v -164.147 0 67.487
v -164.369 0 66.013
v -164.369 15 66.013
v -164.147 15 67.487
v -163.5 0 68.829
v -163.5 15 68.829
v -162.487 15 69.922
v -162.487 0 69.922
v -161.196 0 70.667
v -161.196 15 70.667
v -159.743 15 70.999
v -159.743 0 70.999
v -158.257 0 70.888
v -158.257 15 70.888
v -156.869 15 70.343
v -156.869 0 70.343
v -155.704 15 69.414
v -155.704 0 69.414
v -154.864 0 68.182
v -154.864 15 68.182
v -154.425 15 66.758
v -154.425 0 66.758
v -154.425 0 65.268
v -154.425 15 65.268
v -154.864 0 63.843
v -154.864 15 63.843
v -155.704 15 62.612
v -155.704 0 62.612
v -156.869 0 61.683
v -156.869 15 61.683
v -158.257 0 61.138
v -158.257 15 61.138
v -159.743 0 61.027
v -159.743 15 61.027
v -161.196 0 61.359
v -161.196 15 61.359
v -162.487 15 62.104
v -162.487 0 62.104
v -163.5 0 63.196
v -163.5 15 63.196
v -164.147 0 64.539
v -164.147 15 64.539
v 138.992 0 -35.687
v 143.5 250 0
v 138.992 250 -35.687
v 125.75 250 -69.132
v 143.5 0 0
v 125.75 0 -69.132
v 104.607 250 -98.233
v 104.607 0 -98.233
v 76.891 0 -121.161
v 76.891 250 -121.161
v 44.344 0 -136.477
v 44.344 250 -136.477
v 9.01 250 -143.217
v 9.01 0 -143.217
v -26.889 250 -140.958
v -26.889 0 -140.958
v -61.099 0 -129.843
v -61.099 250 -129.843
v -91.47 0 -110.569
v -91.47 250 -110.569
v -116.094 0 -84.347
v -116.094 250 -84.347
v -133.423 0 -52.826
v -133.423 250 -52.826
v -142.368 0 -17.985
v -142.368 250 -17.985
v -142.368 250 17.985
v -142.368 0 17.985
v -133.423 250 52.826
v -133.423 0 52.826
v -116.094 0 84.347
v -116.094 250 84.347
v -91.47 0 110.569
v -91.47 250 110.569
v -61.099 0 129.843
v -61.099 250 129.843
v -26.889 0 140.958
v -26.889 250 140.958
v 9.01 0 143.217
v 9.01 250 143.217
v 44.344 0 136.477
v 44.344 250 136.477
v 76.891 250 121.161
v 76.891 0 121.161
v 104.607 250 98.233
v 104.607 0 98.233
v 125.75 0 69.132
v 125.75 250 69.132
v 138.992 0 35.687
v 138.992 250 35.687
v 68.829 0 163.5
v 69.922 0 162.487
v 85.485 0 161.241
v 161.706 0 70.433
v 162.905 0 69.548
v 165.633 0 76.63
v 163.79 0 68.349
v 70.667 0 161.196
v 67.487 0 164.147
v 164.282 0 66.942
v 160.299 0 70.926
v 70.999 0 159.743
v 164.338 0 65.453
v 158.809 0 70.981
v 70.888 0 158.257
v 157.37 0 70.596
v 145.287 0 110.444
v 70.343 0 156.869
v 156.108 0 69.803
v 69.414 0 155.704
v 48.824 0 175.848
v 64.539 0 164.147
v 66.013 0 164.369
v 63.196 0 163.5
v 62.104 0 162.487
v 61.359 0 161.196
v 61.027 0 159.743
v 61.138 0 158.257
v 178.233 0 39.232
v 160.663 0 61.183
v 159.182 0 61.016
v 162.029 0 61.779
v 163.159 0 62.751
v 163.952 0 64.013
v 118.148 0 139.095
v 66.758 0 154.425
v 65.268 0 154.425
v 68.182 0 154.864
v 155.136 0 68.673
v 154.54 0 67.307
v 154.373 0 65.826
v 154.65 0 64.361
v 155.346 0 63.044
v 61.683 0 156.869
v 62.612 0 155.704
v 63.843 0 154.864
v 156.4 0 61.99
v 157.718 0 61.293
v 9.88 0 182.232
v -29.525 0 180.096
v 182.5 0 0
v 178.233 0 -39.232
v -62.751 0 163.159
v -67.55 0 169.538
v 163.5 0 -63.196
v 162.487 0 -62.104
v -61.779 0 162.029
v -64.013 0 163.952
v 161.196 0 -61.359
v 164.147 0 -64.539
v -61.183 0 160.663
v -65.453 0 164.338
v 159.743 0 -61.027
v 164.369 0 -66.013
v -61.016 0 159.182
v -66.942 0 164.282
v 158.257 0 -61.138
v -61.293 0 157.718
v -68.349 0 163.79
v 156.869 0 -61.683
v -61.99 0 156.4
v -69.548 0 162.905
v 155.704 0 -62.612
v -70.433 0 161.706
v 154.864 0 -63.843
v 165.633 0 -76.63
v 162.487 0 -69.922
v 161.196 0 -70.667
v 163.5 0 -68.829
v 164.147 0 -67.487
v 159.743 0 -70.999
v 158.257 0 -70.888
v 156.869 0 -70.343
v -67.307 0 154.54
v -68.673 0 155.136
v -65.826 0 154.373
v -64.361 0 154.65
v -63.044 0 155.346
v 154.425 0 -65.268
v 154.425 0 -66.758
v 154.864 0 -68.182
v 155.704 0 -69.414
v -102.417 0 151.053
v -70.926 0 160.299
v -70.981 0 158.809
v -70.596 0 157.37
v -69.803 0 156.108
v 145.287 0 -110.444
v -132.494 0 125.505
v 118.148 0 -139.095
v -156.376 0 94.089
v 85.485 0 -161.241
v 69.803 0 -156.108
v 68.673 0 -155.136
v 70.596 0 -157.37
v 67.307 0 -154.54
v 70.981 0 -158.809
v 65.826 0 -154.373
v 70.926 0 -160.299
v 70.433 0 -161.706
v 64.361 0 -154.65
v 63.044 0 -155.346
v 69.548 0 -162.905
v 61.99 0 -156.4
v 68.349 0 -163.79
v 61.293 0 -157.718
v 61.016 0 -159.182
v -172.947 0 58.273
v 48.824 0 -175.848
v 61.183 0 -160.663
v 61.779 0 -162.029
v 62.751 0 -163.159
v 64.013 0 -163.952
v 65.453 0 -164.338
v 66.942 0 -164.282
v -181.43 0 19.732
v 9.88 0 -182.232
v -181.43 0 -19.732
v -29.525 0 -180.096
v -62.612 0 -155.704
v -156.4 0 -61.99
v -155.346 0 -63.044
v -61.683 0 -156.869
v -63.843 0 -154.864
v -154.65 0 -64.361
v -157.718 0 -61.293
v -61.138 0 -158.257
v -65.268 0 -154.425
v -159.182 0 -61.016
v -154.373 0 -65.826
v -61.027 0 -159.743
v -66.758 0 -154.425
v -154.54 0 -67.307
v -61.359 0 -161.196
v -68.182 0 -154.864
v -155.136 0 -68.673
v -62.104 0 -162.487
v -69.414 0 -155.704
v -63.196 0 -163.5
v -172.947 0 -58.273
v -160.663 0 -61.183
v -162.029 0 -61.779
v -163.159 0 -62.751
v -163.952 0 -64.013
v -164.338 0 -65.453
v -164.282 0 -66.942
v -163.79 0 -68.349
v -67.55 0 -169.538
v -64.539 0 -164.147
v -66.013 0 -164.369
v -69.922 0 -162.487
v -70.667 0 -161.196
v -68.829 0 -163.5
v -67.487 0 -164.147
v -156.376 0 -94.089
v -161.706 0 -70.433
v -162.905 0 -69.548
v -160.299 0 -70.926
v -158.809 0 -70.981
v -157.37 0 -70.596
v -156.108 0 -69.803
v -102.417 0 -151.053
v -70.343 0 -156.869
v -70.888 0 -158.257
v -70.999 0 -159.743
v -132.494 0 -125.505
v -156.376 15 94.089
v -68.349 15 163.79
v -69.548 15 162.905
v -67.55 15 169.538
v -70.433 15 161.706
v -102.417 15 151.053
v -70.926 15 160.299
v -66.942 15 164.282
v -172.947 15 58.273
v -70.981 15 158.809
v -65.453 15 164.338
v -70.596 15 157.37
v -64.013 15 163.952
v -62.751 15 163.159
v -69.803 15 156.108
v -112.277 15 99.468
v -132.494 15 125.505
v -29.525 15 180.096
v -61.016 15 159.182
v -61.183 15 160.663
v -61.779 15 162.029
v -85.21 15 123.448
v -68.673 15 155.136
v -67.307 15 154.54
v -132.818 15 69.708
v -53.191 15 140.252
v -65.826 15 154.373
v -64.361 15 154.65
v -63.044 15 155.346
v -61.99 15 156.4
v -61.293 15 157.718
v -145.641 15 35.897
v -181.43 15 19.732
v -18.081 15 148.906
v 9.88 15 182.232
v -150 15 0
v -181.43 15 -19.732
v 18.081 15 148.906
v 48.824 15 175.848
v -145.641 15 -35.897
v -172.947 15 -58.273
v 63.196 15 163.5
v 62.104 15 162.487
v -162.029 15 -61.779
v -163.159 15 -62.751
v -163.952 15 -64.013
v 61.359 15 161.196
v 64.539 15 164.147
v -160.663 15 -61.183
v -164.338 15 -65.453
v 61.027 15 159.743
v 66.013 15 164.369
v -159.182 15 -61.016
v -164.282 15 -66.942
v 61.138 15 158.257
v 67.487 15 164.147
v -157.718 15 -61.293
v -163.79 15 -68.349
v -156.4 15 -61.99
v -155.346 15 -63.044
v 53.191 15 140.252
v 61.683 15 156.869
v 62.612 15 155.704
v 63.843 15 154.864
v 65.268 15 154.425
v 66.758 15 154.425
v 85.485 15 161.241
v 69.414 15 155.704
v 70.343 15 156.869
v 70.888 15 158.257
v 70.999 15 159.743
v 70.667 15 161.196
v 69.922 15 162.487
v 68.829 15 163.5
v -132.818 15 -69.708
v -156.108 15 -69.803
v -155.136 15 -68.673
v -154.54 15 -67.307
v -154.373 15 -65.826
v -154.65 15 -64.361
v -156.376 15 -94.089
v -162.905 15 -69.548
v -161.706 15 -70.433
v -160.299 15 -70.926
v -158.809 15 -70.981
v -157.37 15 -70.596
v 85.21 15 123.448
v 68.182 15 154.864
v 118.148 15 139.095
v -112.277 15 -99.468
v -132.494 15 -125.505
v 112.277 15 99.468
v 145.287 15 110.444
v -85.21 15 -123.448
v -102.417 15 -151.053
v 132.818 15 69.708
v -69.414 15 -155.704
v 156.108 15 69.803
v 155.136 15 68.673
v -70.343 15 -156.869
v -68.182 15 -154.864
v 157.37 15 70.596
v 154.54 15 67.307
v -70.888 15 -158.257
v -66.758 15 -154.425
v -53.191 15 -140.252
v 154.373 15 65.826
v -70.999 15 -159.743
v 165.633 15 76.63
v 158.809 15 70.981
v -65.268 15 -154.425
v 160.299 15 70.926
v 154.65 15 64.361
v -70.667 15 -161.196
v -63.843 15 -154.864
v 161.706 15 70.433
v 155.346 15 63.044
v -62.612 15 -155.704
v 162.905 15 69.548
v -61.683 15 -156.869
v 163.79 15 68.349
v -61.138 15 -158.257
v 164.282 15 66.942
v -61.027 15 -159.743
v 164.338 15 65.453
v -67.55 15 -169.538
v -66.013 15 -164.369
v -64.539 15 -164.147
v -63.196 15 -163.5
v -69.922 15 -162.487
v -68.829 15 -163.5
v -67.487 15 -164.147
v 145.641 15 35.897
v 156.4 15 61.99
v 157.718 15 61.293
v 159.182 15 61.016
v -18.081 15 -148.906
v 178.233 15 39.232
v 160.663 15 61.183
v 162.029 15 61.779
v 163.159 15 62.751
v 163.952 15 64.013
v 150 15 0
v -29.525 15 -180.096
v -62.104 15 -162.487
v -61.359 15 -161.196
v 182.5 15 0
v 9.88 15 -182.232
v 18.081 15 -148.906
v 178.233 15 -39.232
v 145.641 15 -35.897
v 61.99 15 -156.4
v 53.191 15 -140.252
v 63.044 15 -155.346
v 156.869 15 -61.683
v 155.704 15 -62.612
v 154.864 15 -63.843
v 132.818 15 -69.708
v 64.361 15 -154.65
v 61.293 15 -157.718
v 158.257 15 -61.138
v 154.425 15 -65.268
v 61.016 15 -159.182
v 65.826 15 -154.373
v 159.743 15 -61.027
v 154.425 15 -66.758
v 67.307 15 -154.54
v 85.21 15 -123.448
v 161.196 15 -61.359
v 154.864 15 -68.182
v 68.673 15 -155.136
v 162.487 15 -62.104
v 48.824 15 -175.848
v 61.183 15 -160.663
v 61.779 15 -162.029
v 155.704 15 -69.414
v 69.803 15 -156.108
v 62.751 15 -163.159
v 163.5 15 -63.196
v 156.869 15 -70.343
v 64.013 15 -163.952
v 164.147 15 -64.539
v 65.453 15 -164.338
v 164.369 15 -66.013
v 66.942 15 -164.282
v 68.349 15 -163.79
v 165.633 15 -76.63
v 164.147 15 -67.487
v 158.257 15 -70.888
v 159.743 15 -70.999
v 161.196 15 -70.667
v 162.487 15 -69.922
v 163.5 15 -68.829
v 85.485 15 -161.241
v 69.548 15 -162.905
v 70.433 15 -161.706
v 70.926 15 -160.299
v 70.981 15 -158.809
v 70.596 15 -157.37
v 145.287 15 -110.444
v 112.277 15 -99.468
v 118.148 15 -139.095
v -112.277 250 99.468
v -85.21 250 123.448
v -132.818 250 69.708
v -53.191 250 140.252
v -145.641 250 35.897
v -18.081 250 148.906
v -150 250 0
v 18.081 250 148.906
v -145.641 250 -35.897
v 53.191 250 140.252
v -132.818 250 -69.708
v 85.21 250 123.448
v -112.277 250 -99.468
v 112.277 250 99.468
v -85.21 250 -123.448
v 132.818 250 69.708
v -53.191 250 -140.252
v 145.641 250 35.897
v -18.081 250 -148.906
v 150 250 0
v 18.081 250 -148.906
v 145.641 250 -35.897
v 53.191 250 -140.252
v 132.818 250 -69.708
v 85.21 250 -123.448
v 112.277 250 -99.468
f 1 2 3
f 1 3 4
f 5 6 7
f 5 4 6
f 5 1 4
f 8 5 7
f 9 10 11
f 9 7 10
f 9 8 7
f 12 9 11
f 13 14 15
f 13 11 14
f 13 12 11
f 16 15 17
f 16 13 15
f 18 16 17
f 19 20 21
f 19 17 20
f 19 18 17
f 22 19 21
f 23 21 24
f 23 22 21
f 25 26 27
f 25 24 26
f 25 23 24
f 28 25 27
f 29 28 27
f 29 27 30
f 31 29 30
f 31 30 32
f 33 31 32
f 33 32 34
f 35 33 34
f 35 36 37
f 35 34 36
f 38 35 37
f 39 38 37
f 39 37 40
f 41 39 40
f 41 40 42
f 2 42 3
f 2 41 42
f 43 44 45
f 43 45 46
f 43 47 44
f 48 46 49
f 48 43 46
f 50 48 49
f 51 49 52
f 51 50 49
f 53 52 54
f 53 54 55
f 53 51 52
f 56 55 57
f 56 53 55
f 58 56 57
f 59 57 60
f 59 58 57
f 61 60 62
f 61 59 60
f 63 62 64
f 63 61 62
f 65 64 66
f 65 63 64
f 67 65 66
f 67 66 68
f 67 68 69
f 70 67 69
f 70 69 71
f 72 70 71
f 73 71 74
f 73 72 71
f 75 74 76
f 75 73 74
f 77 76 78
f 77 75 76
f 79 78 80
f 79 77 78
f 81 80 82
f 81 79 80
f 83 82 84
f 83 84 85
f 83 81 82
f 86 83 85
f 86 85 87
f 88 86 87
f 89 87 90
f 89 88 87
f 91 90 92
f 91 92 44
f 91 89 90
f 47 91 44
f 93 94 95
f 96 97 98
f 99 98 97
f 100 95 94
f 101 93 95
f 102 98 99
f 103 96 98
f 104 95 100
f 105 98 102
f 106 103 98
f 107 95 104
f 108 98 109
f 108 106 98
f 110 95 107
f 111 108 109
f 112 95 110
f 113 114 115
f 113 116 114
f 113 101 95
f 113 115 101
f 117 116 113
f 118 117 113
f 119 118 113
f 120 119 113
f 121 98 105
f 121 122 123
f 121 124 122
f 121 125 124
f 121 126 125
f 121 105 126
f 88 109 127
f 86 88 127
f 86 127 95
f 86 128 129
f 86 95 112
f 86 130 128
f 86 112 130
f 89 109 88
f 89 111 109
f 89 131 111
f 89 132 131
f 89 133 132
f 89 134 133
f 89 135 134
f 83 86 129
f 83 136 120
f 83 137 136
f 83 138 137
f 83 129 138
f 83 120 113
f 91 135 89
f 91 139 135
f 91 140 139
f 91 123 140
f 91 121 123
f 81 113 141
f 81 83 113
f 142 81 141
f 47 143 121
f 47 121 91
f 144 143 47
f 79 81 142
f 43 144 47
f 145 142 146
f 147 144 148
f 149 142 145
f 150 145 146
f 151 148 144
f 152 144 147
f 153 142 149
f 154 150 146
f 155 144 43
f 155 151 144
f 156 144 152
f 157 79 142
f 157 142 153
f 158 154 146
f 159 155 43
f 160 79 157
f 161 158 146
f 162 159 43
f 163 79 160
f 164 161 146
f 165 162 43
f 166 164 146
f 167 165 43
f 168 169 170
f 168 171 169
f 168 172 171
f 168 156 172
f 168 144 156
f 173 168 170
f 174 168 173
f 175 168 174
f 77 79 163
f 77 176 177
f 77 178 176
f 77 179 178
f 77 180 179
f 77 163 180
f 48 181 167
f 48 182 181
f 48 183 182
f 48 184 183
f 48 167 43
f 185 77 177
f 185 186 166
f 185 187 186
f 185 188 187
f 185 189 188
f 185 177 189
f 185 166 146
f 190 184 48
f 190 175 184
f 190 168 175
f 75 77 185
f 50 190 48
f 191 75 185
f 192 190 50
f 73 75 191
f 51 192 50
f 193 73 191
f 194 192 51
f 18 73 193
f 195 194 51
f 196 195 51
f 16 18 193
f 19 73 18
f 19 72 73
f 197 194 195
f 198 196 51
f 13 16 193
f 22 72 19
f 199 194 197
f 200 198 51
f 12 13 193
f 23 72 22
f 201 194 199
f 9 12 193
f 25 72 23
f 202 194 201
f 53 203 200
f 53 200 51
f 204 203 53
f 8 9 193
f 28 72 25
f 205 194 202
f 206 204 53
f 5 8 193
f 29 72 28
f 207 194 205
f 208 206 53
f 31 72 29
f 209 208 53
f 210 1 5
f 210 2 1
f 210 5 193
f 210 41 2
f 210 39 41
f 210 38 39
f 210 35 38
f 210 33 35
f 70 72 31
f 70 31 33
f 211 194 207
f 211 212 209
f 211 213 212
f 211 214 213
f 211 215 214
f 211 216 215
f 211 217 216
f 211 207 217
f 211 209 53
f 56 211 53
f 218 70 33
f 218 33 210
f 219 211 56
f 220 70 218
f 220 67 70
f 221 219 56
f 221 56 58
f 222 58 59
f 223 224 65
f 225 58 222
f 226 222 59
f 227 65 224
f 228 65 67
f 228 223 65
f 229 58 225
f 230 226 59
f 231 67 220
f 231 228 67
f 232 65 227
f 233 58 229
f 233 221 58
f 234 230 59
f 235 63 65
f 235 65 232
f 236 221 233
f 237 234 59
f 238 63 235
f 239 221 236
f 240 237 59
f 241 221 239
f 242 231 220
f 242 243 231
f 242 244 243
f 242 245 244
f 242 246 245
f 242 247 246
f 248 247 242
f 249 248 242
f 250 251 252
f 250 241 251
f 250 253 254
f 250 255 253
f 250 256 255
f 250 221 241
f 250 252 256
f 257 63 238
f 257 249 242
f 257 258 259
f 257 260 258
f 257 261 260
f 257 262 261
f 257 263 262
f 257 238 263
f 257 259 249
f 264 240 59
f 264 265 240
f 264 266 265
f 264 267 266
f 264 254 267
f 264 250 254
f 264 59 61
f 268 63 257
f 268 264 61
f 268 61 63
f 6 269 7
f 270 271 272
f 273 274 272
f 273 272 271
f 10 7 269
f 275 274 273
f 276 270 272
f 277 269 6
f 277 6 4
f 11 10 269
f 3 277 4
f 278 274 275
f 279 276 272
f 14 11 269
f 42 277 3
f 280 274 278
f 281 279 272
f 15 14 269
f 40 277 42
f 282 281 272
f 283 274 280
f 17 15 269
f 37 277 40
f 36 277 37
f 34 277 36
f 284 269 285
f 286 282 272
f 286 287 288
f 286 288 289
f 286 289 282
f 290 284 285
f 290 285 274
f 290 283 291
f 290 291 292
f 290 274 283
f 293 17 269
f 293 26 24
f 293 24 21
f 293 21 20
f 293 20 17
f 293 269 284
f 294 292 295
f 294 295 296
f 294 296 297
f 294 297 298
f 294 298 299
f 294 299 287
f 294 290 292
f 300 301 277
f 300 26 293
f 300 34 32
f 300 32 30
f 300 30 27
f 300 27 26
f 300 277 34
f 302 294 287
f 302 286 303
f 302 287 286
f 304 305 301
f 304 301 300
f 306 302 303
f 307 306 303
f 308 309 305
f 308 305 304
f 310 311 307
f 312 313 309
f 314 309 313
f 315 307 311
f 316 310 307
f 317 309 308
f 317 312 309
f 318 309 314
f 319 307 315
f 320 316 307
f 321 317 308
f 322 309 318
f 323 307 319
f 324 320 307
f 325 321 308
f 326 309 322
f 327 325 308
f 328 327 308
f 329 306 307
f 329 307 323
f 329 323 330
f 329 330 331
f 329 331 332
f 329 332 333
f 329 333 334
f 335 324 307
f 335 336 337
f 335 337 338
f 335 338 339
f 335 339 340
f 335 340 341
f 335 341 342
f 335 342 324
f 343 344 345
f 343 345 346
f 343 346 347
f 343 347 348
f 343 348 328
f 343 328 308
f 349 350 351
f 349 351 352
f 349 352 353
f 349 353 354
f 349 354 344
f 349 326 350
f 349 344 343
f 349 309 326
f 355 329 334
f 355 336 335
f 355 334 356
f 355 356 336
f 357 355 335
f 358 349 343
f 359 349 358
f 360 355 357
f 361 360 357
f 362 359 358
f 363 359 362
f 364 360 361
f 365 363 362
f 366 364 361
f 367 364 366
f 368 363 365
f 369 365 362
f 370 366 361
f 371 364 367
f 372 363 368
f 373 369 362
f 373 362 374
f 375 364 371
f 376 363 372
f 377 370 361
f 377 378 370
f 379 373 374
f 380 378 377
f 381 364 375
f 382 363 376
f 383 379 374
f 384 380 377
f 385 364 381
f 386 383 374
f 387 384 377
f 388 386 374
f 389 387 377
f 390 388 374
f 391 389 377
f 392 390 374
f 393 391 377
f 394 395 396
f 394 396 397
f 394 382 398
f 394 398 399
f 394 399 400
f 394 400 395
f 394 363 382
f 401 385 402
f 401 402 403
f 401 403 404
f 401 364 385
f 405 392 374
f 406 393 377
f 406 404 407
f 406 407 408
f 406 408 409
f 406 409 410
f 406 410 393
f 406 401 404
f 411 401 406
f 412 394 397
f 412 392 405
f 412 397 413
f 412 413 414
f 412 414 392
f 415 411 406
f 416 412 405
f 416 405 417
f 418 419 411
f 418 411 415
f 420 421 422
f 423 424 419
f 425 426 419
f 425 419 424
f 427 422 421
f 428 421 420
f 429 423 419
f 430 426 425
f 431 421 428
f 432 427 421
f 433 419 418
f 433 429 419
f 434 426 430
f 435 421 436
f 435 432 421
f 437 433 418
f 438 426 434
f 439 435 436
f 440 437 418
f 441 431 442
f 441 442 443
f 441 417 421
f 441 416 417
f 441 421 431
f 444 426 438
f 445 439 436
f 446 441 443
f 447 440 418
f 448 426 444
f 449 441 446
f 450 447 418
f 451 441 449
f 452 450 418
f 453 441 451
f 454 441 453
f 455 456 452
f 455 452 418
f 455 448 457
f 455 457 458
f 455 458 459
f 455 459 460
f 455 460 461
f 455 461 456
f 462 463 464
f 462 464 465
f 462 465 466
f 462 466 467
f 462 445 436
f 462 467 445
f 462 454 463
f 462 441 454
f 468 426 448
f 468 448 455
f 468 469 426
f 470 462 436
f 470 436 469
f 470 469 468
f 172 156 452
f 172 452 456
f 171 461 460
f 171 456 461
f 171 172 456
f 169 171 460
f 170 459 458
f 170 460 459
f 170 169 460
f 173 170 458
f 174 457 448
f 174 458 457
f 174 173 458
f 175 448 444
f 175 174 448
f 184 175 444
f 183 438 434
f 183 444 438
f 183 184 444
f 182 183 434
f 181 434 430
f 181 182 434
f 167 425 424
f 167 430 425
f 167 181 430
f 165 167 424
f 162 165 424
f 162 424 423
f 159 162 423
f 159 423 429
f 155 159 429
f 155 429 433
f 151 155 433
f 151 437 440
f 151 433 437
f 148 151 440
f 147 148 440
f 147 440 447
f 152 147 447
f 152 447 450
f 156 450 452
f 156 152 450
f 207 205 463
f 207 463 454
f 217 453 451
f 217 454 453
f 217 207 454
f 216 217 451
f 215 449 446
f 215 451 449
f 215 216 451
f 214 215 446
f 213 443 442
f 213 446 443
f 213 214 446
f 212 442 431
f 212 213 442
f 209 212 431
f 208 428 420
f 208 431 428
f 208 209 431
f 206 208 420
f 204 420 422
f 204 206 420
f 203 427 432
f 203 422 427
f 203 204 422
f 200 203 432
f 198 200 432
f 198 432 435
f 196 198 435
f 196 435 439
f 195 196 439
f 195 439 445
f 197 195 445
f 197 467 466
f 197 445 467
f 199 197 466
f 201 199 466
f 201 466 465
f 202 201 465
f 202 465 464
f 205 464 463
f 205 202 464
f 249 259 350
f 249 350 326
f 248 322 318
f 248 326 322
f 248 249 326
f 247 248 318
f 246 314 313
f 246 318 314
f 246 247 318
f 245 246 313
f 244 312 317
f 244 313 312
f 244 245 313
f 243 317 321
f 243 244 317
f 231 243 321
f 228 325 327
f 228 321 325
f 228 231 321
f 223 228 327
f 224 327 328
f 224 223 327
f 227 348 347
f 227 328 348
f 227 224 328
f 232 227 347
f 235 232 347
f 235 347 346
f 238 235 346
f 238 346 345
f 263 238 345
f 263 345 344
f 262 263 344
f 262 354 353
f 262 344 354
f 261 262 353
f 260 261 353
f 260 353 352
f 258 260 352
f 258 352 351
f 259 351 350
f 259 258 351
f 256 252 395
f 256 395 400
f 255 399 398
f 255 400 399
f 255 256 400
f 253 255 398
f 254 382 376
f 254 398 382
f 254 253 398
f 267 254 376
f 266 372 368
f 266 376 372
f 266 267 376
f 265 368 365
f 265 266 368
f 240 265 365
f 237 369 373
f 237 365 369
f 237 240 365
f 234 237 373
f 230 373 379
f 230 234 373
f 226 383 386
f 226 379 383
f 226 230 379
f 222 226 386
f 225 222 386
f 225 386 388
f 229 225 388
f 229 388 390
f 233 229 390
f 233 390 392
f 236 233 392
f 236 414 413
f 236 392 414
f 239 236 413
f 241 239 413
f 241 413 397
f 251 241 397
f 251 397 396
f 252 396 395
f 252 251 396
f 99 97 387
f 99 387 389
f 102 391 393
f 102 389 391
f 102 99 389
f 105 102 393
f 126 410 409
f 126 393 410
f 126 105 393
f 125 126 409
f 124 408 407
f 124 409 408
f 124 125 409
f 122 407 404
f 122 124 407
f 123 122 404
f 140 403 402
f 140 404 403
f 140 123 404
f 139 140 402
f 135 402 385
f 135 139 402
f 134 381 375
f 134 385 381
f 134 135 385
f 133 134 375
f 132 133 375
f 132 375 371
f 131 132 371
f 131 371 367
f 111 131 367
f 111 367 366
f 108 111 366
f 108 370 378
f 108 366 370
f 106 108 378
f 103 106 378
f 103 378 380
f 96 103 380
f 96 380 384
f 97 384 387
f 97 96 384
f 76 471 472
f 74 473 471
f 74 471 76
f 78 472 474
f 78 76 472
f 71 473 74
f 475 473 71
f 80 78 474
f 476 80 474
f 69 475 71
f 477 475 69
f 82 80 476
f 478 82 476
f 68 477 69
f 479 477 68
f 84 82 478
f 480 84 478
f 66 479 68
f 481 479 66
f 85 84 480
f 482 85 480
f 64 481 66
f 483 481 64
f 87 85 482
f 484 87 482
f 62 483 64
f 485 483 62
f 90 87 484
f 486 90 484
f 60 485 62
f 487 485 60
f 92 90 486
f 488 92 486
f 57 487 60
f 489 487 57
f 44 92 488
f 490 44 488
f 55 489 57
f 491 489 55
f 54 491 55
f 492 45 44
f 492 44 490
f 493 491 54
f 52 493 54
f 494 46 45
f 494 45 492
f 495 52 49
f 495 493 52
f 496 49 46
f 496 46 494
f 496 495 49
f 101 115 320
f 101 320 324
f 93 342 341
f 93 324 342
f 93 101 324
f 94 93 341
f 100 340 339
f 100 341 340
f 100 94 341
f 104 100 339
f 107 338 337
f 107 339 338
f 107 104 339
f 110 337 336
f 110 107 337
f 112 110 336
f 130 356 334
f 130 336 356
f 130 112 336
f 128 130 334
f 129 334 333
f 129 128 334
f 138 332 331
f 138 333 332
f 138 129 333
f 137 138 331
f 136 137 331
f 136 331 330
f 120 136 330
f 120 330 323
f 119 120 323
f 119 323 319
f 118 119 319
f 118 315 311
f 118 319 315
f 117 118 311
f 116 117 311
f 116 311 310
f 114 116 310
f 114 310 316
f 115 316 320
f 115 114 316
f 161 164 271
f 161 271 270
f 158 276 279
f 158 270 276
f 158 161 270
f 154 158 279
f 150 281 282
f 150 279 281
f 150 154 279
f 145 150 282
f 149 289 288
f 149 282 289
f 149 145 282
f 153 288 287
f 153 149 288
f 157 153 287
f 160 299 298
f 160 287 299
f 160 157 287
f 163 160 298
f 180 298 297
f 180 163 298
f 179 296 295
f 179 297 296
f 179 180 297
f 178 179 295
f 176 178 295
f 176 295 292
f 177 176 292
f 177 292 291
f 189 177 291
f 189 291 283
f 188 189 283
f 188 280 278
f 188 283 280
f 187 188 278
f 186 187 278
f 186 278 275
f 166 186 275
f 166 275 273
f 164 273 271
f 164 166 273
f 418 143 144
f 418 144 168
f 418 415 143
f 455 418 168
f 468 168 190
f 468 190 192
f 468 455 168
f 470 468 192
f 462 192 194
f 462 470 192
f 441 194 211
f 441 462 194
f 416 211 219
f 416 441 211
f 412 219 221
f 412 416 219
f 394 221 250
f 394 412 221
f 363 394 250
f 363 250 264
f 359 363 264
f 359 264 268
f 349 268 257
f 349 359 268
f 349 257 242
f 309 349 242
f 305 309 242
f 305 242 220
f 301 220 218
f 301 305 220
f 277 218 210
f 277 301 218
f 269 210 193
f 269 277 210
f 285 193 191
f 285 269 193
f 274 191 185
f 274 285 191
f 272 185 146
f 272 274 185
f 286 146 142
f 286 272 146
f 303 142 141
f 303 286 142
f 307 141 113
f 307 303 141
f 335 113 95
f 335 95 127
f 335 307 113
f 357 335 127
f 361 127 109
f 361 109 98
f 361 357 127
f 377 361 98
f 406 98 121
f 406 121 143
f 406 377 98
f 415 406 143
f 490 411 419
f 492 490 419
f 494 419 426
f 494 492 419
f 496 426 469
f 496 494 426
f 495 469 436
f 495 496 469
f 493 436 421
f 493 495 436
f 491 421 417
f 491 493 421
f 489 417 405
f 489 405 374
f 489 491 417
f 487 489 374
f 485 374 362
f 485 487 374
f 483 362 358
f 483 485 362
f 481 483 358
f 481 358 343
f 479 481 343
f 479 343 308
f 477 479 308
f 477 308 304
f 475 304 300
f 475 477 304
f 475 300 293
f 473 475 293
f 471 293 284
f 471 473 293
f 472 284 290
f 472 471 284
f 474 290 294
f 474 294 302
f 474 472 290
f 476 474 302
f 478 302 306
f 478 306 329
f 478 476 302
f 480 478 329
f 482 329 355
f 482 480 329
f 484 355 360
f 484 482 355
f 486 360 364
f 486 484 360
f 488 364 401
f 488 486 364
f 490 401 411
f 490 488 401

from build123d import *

# Parameters (mm, degrees)
CUT_EXTRUDE1_START = -16
SKETCH2_R          = 5
CUT_EXTRUDE1_DEPTH = 252
CIRPATTERN1_COUNT  = 8


with BuildPart() as part:
    # Sketch1 → Revolve1 (revolve)
    with BuildSketch(Plane.XY):
        Polygon((143.5, 250), (143.5, 0), (182.5, 0), (182.5, 15), (150, 15), (150, 250), align=None)
    revolve(axis=Axis((0, 0, 0), (0, 1, 0)))

    # Sketch2 → Cut-Extrude1 (cut)
    with BuildSketch(Plane(origin=(0, 15, 0), x_dir=(1, 0, 0), z_dir=(0, 1, 0)).offset(CUT_EXTRUDE1_START)):
        with Locations((159.369219358, 66.012892083)):
            Circle(SKETCH2_R)
    cut_extrude1 = extrude(amount=CUT_EXTRUDE1_DEPTH, mode=Mode.SUBTRACT)

    # CirPattern1: Cut-Extrude1 ×8 about axis
    cirpattern1_axis = Axis((0, 0, 0), (0, 1, 0))
    for i in range(1, CIRPATTERN1_COUNT):
        add(cut_extrude1.rotate(cirpattern1_axis, i * 360 / CIRPATTERN1_COUNT), mode=Mode.SUBTRACT)


solid = part.part
